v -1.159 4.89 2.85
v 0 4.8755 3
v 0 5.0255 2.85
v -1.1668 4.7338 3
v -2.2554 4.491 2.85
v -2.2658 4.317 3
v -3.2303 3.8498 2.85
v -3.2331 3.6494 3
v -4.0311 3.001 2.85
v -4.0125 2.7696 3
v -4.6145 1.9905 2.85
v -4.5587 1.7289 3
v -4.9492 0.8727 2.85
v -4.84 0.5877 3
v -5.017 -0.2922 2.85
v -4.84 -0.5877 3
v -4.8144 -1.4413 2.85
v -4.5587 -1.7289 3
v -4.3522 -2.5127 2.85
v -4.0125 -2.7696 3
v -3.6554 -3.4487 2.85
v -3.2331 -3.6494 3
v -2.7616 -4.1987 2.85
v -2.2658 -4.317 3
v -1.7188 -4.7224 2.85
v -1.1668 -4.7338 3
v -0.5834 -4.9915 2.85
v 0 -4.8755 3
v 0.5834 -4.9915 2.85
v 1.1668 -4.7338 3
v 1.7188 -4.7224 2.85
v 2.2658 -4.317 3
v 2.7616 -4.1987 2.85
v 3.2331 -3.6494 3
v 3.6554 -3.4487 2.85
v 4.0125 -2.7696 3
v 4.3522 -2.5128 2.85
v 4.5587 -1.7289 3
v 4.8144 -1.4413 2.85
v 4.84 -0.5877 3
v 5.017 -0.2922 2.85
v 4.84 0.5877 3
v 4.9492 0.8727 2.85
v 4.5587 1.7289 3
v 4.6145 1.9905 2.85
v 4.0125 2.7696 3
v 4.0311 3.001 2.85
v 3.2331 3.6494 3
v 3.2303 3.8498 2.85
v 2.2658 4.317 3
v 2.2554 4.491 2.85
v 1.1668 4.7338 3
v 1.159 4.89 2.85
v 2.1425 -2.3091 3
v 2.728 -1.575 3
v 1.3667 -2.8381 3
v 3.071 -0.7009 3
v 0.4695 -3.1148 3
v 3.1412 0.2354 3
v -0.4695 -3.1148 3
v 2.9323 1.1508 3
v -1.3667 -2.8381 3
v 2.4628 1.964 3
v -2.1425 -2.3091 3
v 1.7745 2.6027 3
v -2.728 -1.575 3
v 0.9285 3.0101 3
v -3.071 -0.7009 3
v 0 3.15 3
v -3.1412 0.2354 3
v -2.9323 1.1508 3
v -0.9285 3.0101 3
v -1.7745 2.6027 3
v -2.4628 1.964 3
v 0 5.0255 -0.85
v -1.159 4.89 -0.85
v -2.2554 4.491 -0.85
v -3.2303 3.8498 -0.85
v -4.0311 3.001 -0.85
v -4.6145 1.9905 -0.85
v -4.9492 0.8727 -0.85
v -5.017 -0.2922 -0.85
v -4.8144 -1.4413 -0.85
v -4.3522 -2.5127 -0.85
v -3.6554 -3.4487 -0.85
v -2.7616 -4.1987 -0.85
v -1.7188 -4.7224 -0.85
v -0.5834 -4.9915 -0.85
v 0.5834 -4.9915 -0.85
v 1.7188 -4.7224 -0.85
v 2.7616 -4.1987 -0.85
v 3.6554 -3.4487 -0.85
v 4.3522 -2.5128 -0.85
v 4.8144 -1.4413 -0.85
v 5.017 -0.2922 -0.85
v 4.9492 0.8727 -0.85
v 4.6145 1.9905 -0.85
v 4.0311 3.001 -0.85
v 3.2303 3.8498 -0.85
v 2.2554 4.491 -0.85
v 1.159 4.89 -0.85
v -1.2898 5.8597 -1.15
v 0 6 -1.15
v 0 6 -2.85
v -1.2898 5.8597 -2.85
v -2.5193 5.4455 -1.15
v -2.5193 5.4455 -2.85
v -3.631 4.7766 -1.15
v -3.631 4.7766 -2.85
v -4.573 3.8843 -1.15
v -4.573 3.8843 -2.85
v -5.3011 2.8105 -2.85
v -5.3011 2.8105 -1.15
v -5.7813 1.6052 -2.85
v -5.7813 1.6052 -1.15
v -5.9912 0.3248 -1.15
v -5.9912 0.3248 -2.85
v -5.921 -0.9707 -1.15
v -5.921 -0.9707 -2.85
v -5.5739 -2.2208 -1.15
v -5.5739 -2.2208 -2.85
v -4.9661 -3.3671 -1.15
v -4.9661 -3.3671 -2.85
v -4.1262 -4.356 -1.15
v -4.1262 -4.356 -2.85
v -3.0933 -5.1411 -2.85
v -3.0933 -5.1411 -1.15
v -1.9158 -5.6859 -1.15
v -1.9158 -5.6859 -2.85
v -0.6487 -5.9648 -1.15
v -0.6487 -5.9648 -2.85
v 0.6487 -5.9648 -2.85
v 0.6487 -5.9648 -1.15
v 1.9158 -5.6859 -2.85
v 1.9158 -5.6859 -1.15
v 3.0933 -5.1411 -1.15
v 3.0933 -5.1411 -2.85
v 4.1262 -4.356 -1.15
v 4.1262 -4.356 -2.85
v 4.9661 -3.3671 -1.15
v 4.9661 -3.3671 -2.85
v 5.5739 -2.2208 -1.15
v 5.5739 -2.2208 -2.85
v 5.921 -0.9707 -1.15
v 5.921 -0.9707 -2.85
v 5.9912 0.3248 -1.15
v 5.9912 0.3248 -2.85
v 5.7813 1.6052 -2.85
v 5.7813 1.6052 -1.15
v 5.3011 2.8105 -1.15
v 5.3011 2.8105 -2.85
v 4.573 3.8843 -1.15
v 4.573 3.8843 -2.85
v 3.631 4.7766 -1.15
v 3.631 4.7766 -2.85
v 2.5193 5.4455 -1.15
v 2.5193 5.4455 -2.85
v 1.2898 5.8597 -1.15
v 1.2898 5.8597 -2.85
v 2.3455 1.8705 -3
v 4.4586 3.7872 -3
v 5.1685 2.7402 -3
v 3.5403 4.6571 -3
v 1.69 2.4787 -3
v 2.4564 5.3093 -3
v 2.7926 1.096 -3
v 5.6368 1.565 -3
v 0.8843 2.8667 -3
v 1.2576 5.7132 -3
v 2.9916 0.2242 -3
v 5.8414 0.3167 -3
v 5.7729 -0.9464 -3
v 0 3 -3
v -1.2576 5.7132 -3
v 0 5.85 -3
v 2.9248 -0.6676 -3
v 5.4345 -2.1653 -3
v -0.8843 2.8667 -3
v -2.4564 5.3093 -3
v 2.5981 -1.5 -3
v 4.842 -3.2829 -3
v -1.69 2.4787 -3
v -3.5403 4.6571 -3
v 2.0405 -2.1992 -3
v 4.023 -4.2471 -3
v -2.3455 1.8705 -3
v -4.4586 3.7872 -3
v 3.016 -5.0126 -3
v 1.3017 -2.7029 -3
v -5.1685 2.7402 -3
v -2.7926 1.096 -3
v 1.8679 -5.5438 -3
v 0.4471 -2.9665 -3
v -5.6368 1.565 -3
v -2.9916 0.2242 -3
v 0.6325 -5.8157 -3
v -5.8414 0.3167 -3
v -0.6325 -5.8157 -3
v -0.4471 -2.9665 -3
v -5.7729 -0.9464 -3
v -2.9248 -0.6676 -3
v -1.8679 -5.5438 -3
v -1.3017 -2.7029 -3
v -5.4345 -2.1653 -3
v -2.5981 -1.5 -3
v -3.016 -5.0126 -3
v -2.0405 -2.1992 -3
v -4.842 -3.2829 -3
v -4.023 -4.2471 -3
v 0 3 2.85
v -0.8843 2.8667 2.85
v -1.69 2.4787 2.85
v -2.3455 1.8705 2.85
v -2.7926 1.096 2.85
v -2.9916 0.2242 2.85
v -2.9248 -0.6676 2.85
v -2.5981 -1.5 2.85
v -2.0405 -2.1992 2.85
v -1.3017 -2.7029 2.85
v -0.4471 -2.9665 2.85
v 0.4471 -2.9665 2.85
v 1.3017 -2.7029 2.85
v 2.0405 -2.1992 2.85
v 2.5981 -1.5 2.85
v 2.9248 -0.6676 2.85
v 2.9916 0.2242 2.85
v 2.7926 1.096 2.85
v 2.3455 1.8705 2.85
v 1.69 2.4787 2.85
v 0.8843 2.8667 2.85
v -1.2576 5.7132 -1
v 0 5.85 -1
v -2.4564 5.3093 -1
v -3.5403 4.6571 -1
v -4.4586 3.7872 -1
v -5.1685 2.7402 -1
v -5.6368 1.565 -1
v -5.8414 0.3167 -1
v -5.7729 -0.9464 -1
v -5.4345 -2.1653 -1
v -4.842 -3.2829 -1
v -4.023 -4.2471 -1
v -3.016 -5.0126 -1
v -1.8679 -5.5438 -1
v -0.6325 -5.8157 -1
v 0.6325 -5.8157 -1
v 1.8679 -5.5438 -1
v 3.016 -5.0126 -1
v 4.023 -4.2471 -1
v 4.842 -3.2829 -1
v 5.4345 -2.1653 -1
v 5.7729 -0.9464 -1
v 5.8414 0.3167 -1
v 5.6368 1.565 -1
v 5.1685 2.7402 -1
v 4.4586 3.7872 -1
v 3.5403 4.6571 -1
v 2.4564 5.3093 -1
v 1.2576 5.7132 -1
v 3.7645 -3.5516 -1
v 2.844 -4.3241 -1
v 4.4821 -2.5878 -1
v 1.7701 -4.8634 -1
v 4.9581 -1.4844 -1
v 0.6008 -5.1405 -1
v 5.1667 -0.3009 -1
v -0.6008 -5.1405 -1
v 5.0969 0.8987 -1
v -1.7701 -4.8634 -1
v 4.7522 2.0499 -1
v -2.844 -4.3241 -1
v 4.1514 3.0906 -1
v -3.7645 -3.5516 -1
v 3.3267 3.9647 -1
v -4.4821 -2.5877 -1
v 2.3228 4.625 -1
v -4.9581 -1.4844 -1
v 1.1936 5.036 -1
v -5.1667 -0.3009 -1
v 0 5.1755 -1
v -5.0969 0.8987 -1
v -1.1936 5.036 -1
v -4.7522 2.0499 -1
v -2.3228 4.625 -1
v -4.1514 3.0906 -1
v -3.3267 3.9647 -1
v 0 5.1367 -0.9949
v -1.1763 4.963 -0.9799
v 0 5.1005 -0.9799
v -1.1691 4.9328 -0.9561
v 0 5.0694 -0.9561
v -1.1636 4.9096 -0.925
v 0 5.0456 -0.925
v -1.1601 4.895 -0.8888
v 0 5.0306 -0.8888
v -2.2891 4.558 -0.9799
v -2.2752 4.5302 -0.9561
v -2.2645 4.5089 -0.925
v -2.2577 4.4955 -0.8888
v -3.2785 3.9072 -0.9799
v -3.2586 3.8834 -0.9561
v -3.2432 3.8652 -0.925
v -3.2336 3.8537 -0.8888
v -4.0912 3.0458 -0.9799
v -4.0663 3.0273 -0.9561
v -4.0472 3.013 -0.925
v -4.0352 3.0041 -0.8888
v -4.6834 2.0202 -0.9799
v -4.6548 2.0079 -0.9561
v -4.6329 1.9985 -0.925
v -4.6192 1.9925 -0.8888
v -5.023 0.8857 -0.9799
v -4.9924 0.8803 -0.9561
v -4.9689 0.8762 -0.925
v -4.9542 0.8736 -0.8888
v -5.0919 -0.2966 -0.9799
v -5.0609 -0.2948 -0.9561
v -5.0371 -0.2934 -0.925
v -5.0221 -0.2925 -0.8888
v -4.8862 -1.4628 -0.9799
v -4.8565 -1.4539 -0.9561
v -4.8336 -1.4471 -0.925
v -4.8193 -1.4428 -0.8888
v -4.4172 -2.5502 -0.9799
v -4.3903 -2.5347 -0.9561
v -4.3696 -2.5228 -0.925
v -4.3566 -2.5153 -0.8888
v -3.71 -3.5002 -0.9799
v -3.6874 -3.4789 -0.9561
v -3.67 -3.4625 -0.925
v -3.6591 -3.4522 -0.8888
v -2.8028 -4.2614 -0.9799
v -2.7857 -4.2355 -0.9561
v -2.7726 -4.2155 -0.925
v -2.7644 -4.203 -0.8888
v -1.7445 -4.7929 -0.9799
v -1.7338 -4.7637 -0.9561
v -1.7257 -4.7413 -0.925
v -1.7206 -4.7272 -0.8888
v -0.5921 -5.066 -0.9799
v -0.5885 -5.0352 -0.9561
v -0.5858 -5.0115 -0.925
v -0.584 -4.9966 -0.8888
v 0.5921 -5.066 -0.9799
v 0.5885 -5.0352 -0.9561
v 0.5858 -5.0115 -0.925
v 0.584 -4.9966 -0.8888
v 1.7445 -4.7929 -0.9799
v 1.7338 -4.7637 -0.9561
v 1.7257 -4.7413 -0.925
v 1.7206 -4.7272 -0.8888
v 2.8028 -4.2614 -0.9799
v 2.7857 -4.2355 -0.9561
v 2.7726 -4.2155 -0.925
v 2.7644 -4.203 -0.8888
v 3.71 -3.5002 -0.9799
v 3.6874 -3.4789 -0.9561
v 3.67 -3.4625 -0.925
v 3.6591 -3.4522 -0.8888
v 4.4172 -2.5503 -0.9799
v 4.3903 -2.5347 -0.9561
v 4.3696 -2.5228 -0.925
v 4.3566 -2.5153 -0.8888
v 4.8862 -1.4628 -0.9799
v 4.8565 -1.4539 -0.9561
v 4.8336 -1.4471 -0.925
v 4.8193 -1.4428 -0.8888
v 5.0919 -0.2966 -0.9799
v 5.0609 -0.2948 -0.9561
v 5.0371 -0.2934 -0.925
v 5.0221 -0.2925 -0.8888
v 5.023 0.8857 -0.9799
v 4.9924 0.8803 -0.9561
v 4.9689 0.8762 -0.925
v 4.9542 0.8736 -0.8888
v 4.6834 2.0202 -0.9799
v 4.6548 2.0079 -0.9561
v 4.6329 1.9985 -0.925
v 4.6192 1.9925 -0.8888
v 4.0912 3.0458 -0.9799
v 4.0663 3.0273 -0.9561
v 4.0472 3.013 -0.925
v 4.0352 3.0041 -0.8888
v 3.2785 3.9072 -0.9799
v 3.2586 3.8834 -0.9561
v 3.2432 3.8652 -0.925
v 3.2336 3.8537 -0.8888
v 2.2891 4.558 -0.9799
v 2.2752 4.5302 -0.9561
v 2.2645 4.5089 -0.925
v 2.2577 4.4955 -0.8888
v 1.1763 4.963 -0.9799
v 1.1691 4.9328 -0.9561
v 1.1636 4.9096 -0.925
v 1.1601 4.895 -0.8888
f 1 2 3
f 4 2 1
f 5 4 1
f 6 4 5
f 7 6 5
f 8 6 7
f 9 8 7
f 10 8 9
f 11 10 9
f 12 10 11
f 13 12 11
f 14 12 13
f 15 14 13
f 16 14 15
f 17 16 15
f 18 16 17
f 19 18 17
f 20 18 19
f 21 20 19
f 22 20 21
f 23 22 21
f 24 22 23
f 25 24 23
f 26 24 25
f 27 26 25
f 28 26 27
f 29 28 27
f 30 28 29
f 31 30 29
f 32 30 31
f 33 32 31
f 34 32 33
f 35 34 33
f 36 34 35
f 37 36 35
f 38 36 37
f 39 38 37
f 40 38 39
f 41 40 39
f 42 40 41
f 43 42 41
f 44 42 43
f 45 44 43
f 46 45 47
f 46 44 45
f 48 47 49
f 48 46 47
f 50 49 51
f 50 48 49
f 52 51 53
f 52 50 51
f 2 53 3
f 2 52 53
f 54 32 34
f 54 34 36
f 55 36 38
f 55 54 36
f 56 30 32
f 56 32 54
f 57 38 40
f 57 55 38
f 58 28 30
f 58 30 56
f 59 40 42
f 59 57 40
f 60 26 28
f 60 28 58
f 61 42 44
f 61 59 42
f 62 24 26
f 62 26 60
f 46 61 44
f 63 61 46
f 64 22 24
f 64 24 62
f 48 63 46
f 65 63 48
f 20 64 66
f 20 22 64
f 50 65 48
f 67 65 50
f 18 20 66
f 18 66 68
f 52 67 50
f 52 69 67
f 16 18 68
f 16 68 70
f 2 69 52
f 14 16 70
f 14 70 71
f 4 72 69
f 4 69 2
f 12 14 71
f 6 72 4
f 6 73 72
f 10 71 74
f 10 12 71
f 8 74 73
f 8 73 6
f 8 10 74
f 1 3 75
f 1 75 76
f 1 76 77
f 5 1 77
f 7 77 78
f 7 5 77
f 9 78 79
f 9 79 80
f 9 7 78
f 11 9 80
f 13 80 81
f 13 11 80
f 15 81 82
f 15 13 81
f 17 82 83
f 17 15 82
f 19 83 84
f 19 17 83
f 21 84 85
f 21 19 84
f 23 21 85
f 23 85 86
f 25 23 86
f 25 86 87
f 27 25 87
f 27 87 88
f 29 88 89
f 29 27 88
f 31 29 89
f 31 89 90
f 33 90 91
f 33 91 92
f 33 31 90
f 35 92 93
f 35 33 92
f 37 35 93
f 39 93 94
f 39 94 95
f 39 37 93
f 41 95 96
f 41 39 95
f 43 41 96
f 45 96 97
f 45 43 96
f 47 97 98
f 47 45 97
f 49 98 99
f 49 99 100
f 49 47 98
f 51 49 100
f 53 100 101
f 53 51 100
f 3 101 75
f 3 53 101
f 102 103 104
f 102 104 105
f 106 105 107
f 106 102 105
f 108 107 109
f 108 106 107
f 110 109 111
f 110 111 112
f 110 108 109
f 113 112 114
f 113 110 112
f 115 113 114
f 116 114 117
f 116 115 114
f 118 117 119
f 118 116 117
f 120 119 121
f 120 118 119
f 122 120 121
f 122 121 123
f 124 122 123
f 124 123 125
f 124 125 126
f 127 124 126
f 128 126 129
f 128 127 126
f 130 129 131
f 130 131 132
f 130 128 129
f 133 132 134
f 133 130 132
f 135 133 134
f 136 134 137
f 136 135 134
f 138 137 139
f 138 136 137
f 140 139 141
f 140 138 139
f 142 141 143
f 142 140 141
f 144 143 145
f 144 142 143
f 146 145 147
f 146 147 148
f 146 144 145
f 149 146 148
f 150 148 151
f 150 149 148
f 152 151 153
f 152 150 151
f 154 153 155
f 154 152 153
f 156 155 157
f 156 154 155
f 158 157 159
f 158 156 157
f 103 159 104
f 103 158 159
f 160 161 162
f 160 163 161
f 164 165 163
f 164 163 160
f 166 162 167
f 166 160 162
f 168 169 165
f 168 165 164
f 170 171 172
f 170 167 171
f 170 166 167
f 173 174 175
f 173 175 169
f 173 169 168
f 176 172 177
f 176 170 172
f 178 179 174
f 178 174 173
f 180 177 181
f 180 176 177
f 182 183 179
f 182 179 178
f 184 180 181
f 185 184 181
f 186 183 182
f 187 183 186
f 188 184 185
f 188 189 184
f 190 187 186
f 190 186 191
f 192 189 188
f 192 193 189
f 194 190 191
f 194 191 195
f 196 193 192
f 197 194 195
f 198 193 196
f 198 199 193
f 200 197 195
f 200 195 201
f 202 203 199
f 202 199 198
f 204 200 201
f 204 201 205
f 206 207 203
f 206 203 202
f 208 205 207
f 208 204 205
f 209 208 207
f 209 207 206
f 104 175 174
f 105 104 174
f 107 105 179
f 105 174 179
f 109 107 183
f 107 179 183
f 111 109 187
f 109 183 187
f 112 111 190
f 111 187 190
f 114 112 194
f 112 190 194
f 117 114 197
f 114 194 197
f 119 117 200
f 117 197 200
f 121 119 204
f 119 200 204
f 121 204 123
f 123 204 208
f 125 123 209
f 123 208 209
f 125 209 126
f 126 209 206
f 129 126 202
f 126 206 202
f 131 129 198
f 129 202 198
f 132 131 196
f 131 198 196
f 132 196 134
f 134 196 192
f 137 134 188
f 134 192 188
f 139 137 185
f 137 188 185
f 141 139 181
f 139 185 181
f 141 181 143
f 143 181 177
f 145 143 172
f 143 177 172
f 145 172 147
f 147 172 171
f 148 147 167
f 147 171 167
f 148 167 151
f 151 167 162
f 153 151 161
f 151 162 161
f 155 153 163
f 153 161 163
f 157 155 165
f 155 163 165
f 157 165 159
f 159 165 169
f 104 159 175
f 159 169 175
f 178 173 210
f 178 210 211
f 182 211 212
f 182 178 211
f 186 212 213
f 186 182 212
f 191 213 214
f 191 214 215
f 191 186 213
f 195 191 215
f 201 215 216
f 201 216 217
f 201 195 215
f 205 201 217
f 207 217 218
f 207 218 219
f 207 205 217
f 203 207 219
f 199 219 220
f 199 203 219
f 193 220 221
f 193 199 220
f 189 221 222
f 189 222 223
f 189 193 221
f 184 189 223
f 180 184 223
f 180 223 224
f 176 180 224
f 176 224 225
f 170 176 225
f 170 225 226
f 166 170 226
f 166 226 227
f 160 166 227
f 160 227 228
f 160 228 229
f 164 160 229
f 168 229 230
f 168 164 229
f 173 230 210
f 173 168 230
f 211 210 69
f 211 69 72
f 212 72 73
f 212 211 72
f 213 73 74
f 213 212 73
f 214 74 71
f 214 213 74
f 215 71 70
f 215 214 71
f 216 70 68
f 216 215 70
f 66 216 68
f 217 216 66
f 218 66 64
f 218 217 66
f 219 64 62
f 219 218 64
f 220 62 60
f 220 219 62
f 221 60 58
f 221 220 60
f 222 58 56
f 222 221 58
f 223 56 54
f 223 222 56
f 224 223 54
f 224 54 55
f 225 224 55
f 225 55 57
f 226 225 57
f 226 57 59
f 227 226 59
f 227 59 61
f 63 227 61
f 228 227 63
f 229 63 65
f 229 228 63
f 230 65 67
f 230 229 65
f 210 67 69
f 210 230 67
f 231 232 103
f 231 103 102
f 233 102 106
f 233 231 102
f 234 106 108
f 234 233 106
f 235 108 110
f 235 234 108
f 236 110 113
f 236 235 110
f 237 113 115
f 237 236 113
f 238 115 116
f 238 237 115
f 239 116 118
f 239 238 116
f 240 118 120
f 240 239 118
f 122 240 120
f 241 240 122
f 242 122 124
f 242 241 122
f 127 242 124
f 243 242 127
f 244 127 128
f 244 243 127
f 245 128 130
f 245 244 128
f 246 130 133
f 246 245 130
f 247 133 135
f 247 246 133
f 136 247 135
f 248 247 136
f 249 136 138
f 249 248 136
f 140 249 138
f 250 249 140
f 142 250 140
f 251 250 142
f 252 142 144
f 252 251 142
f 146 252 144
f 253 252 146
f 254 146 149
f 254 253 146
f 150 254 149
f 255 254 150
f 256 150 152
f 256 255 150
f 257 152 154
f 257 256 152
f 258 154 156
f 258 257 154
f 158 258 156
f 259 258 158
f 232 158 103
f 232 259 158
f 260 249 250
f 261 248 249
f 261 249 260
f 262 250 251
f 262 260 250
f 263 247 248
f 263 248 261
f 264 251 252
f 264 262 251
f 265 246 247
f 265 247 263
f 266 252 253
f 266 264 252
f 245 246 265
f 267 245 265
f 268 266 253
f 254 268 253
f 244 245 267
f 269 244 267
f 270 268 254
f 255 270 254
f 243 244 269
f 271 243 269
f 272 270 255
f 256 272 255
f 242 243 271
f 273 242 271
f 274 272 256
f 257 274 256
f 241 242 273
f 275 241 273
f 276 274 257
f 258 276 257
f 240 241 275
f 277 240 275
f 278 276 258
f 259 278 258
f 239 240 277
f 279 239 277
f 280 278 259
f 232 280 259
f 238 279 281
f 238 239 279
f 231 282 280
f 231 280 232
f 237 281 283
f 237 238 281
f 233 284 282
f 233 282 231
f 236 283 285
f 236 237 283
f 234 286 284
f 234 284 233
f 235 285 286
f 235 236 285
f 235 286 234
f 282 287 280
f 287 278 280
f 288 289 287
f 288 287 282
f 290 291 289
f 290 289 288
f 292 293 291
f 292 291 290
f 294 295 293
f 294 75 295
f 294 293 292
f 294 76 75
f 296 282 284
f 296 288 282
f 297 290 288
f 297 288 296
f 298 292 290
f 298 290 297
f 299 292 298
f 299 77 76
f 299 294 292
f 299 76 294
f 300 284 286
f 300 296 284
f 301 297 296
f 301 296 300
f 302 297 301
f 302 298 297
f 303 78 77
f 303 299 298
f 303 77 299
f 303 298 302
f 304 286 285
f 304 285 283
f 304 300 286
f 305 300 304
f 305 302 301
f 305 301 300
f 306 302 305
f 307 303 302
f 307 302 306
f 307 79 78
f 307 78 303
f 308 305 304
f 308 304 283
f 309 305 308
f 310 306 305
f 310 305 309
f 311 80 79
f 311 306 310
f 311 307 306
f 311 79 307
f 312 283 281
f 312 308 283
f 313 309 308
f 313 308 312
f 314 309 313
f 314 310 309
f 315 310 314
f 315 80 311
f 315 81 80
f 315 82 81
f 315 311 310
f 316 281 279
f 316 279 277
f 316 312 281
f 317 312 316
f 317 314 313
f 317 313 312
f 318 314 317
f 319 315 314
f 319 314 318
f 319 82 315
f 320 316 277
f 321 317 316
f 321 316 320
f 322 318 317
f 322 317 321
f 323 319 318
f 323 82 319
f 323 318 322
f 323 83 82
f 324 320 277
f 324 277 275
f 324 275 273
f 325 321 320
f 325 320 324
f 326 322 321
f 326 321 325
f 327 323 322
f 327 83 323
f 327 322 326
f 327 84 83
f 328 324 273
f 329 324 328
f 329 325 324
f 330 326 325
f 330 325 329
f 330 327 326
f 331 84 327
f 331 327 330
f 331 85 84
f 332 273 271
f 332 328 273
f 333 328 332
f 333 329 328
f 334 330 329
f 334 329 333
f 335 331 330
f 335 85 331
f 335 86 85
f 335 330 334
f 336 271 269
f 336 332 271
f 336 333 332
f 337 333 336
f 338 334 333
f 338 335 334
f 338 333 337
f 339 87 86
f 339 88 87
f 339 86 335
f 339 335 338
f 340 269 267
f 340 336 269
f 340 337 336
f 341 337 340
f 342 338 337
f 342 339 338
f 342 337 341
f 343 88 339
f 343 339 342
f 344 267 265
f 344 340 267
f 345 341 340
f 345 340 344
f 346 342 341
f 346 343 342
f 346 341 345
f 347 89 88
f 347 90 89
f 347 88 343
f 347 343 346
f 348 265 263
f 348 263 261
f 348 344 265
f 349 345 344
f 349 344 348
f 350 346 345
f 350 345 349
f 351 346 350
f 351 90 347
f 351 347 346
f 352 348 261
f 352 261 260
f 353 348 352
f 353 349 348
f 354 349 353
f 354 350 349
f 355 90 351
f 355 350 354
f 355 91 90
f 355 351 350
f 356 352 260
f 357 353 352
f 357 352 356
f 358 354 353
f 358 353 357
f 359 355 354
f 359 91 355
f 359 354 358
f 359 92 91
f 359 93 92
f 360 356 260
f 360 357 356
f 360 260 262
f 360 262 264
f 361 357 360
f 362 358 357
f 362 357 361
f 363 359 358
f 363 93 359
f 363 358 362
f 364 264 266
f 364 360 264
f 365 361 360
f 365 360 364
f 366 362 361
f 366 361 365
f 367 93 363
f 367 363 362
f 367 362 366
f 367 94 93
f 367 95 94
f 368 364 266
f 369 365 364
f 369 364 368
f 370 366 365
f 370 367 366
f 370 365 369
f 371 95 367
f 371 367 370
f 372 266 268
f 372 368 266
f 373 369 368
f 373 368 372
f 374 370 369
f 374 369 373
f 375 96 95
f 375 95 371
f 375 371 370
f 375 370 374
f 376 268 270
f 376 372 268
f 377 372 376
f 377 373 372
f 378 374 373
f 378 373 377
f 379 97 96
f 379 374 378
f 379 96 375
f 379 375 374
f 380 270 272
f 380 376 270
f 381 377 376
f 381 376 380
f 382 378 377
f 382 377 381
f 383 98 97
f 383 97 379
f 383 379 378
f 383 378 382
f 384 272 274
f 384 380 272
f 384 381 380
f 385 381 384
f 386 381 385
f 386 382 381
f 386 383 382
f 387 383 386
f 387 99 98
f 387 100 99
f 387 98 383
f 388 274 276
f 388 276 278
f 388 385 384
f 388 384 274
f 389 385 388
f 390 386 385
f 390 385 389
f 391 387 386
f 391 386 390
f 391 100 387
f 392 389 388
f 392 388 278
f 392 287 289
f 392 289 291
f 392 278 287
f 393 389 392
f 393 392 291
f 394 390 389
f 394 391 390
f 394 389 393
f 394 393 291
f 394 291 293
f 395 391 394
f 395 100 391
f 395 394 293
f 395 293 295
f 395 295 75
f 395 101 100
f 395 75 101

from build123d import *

# Parameters (mm, degrees)
CHAMFER1_SIZE = 0.15
FILLET1_R     = 0.15


with BuildPart() as part:
    # Sketch3 → Revolve1 (revolve)
    with BuildSketch(Plane(origin=(0, 0, 0), x_dir=(0, 0, -1), z_dir=(1, 0, 0))):
        Polygon((3, 6), (1, 6), (1, 5.0255), (-3, 5.0255), (-3, 3), (3, 3), align=None)
    revolve(axis=Axis((0, 0, -3), (0, 0, 1)))

    # Chamfer1
    chamfer1_edges = [part.edges().sort_by_distance(p)[0] for p in [
        (0, -3, 3),
        (0, -5.0255, 3),
        (0, -6, -1),
        (0, -6, -3),
    ]]
    chamfer(chamfer1_edges, length=CHAMFER1_SIZE)

    # Fillet1
    fillet1_edges = [part.edges().sort_by_distance(p)[0] for p in [
        (0, -5.0255, -1),
    ]]
    fillet(fillet1_edges, radius=FILLET1_R)


solid = part.part
